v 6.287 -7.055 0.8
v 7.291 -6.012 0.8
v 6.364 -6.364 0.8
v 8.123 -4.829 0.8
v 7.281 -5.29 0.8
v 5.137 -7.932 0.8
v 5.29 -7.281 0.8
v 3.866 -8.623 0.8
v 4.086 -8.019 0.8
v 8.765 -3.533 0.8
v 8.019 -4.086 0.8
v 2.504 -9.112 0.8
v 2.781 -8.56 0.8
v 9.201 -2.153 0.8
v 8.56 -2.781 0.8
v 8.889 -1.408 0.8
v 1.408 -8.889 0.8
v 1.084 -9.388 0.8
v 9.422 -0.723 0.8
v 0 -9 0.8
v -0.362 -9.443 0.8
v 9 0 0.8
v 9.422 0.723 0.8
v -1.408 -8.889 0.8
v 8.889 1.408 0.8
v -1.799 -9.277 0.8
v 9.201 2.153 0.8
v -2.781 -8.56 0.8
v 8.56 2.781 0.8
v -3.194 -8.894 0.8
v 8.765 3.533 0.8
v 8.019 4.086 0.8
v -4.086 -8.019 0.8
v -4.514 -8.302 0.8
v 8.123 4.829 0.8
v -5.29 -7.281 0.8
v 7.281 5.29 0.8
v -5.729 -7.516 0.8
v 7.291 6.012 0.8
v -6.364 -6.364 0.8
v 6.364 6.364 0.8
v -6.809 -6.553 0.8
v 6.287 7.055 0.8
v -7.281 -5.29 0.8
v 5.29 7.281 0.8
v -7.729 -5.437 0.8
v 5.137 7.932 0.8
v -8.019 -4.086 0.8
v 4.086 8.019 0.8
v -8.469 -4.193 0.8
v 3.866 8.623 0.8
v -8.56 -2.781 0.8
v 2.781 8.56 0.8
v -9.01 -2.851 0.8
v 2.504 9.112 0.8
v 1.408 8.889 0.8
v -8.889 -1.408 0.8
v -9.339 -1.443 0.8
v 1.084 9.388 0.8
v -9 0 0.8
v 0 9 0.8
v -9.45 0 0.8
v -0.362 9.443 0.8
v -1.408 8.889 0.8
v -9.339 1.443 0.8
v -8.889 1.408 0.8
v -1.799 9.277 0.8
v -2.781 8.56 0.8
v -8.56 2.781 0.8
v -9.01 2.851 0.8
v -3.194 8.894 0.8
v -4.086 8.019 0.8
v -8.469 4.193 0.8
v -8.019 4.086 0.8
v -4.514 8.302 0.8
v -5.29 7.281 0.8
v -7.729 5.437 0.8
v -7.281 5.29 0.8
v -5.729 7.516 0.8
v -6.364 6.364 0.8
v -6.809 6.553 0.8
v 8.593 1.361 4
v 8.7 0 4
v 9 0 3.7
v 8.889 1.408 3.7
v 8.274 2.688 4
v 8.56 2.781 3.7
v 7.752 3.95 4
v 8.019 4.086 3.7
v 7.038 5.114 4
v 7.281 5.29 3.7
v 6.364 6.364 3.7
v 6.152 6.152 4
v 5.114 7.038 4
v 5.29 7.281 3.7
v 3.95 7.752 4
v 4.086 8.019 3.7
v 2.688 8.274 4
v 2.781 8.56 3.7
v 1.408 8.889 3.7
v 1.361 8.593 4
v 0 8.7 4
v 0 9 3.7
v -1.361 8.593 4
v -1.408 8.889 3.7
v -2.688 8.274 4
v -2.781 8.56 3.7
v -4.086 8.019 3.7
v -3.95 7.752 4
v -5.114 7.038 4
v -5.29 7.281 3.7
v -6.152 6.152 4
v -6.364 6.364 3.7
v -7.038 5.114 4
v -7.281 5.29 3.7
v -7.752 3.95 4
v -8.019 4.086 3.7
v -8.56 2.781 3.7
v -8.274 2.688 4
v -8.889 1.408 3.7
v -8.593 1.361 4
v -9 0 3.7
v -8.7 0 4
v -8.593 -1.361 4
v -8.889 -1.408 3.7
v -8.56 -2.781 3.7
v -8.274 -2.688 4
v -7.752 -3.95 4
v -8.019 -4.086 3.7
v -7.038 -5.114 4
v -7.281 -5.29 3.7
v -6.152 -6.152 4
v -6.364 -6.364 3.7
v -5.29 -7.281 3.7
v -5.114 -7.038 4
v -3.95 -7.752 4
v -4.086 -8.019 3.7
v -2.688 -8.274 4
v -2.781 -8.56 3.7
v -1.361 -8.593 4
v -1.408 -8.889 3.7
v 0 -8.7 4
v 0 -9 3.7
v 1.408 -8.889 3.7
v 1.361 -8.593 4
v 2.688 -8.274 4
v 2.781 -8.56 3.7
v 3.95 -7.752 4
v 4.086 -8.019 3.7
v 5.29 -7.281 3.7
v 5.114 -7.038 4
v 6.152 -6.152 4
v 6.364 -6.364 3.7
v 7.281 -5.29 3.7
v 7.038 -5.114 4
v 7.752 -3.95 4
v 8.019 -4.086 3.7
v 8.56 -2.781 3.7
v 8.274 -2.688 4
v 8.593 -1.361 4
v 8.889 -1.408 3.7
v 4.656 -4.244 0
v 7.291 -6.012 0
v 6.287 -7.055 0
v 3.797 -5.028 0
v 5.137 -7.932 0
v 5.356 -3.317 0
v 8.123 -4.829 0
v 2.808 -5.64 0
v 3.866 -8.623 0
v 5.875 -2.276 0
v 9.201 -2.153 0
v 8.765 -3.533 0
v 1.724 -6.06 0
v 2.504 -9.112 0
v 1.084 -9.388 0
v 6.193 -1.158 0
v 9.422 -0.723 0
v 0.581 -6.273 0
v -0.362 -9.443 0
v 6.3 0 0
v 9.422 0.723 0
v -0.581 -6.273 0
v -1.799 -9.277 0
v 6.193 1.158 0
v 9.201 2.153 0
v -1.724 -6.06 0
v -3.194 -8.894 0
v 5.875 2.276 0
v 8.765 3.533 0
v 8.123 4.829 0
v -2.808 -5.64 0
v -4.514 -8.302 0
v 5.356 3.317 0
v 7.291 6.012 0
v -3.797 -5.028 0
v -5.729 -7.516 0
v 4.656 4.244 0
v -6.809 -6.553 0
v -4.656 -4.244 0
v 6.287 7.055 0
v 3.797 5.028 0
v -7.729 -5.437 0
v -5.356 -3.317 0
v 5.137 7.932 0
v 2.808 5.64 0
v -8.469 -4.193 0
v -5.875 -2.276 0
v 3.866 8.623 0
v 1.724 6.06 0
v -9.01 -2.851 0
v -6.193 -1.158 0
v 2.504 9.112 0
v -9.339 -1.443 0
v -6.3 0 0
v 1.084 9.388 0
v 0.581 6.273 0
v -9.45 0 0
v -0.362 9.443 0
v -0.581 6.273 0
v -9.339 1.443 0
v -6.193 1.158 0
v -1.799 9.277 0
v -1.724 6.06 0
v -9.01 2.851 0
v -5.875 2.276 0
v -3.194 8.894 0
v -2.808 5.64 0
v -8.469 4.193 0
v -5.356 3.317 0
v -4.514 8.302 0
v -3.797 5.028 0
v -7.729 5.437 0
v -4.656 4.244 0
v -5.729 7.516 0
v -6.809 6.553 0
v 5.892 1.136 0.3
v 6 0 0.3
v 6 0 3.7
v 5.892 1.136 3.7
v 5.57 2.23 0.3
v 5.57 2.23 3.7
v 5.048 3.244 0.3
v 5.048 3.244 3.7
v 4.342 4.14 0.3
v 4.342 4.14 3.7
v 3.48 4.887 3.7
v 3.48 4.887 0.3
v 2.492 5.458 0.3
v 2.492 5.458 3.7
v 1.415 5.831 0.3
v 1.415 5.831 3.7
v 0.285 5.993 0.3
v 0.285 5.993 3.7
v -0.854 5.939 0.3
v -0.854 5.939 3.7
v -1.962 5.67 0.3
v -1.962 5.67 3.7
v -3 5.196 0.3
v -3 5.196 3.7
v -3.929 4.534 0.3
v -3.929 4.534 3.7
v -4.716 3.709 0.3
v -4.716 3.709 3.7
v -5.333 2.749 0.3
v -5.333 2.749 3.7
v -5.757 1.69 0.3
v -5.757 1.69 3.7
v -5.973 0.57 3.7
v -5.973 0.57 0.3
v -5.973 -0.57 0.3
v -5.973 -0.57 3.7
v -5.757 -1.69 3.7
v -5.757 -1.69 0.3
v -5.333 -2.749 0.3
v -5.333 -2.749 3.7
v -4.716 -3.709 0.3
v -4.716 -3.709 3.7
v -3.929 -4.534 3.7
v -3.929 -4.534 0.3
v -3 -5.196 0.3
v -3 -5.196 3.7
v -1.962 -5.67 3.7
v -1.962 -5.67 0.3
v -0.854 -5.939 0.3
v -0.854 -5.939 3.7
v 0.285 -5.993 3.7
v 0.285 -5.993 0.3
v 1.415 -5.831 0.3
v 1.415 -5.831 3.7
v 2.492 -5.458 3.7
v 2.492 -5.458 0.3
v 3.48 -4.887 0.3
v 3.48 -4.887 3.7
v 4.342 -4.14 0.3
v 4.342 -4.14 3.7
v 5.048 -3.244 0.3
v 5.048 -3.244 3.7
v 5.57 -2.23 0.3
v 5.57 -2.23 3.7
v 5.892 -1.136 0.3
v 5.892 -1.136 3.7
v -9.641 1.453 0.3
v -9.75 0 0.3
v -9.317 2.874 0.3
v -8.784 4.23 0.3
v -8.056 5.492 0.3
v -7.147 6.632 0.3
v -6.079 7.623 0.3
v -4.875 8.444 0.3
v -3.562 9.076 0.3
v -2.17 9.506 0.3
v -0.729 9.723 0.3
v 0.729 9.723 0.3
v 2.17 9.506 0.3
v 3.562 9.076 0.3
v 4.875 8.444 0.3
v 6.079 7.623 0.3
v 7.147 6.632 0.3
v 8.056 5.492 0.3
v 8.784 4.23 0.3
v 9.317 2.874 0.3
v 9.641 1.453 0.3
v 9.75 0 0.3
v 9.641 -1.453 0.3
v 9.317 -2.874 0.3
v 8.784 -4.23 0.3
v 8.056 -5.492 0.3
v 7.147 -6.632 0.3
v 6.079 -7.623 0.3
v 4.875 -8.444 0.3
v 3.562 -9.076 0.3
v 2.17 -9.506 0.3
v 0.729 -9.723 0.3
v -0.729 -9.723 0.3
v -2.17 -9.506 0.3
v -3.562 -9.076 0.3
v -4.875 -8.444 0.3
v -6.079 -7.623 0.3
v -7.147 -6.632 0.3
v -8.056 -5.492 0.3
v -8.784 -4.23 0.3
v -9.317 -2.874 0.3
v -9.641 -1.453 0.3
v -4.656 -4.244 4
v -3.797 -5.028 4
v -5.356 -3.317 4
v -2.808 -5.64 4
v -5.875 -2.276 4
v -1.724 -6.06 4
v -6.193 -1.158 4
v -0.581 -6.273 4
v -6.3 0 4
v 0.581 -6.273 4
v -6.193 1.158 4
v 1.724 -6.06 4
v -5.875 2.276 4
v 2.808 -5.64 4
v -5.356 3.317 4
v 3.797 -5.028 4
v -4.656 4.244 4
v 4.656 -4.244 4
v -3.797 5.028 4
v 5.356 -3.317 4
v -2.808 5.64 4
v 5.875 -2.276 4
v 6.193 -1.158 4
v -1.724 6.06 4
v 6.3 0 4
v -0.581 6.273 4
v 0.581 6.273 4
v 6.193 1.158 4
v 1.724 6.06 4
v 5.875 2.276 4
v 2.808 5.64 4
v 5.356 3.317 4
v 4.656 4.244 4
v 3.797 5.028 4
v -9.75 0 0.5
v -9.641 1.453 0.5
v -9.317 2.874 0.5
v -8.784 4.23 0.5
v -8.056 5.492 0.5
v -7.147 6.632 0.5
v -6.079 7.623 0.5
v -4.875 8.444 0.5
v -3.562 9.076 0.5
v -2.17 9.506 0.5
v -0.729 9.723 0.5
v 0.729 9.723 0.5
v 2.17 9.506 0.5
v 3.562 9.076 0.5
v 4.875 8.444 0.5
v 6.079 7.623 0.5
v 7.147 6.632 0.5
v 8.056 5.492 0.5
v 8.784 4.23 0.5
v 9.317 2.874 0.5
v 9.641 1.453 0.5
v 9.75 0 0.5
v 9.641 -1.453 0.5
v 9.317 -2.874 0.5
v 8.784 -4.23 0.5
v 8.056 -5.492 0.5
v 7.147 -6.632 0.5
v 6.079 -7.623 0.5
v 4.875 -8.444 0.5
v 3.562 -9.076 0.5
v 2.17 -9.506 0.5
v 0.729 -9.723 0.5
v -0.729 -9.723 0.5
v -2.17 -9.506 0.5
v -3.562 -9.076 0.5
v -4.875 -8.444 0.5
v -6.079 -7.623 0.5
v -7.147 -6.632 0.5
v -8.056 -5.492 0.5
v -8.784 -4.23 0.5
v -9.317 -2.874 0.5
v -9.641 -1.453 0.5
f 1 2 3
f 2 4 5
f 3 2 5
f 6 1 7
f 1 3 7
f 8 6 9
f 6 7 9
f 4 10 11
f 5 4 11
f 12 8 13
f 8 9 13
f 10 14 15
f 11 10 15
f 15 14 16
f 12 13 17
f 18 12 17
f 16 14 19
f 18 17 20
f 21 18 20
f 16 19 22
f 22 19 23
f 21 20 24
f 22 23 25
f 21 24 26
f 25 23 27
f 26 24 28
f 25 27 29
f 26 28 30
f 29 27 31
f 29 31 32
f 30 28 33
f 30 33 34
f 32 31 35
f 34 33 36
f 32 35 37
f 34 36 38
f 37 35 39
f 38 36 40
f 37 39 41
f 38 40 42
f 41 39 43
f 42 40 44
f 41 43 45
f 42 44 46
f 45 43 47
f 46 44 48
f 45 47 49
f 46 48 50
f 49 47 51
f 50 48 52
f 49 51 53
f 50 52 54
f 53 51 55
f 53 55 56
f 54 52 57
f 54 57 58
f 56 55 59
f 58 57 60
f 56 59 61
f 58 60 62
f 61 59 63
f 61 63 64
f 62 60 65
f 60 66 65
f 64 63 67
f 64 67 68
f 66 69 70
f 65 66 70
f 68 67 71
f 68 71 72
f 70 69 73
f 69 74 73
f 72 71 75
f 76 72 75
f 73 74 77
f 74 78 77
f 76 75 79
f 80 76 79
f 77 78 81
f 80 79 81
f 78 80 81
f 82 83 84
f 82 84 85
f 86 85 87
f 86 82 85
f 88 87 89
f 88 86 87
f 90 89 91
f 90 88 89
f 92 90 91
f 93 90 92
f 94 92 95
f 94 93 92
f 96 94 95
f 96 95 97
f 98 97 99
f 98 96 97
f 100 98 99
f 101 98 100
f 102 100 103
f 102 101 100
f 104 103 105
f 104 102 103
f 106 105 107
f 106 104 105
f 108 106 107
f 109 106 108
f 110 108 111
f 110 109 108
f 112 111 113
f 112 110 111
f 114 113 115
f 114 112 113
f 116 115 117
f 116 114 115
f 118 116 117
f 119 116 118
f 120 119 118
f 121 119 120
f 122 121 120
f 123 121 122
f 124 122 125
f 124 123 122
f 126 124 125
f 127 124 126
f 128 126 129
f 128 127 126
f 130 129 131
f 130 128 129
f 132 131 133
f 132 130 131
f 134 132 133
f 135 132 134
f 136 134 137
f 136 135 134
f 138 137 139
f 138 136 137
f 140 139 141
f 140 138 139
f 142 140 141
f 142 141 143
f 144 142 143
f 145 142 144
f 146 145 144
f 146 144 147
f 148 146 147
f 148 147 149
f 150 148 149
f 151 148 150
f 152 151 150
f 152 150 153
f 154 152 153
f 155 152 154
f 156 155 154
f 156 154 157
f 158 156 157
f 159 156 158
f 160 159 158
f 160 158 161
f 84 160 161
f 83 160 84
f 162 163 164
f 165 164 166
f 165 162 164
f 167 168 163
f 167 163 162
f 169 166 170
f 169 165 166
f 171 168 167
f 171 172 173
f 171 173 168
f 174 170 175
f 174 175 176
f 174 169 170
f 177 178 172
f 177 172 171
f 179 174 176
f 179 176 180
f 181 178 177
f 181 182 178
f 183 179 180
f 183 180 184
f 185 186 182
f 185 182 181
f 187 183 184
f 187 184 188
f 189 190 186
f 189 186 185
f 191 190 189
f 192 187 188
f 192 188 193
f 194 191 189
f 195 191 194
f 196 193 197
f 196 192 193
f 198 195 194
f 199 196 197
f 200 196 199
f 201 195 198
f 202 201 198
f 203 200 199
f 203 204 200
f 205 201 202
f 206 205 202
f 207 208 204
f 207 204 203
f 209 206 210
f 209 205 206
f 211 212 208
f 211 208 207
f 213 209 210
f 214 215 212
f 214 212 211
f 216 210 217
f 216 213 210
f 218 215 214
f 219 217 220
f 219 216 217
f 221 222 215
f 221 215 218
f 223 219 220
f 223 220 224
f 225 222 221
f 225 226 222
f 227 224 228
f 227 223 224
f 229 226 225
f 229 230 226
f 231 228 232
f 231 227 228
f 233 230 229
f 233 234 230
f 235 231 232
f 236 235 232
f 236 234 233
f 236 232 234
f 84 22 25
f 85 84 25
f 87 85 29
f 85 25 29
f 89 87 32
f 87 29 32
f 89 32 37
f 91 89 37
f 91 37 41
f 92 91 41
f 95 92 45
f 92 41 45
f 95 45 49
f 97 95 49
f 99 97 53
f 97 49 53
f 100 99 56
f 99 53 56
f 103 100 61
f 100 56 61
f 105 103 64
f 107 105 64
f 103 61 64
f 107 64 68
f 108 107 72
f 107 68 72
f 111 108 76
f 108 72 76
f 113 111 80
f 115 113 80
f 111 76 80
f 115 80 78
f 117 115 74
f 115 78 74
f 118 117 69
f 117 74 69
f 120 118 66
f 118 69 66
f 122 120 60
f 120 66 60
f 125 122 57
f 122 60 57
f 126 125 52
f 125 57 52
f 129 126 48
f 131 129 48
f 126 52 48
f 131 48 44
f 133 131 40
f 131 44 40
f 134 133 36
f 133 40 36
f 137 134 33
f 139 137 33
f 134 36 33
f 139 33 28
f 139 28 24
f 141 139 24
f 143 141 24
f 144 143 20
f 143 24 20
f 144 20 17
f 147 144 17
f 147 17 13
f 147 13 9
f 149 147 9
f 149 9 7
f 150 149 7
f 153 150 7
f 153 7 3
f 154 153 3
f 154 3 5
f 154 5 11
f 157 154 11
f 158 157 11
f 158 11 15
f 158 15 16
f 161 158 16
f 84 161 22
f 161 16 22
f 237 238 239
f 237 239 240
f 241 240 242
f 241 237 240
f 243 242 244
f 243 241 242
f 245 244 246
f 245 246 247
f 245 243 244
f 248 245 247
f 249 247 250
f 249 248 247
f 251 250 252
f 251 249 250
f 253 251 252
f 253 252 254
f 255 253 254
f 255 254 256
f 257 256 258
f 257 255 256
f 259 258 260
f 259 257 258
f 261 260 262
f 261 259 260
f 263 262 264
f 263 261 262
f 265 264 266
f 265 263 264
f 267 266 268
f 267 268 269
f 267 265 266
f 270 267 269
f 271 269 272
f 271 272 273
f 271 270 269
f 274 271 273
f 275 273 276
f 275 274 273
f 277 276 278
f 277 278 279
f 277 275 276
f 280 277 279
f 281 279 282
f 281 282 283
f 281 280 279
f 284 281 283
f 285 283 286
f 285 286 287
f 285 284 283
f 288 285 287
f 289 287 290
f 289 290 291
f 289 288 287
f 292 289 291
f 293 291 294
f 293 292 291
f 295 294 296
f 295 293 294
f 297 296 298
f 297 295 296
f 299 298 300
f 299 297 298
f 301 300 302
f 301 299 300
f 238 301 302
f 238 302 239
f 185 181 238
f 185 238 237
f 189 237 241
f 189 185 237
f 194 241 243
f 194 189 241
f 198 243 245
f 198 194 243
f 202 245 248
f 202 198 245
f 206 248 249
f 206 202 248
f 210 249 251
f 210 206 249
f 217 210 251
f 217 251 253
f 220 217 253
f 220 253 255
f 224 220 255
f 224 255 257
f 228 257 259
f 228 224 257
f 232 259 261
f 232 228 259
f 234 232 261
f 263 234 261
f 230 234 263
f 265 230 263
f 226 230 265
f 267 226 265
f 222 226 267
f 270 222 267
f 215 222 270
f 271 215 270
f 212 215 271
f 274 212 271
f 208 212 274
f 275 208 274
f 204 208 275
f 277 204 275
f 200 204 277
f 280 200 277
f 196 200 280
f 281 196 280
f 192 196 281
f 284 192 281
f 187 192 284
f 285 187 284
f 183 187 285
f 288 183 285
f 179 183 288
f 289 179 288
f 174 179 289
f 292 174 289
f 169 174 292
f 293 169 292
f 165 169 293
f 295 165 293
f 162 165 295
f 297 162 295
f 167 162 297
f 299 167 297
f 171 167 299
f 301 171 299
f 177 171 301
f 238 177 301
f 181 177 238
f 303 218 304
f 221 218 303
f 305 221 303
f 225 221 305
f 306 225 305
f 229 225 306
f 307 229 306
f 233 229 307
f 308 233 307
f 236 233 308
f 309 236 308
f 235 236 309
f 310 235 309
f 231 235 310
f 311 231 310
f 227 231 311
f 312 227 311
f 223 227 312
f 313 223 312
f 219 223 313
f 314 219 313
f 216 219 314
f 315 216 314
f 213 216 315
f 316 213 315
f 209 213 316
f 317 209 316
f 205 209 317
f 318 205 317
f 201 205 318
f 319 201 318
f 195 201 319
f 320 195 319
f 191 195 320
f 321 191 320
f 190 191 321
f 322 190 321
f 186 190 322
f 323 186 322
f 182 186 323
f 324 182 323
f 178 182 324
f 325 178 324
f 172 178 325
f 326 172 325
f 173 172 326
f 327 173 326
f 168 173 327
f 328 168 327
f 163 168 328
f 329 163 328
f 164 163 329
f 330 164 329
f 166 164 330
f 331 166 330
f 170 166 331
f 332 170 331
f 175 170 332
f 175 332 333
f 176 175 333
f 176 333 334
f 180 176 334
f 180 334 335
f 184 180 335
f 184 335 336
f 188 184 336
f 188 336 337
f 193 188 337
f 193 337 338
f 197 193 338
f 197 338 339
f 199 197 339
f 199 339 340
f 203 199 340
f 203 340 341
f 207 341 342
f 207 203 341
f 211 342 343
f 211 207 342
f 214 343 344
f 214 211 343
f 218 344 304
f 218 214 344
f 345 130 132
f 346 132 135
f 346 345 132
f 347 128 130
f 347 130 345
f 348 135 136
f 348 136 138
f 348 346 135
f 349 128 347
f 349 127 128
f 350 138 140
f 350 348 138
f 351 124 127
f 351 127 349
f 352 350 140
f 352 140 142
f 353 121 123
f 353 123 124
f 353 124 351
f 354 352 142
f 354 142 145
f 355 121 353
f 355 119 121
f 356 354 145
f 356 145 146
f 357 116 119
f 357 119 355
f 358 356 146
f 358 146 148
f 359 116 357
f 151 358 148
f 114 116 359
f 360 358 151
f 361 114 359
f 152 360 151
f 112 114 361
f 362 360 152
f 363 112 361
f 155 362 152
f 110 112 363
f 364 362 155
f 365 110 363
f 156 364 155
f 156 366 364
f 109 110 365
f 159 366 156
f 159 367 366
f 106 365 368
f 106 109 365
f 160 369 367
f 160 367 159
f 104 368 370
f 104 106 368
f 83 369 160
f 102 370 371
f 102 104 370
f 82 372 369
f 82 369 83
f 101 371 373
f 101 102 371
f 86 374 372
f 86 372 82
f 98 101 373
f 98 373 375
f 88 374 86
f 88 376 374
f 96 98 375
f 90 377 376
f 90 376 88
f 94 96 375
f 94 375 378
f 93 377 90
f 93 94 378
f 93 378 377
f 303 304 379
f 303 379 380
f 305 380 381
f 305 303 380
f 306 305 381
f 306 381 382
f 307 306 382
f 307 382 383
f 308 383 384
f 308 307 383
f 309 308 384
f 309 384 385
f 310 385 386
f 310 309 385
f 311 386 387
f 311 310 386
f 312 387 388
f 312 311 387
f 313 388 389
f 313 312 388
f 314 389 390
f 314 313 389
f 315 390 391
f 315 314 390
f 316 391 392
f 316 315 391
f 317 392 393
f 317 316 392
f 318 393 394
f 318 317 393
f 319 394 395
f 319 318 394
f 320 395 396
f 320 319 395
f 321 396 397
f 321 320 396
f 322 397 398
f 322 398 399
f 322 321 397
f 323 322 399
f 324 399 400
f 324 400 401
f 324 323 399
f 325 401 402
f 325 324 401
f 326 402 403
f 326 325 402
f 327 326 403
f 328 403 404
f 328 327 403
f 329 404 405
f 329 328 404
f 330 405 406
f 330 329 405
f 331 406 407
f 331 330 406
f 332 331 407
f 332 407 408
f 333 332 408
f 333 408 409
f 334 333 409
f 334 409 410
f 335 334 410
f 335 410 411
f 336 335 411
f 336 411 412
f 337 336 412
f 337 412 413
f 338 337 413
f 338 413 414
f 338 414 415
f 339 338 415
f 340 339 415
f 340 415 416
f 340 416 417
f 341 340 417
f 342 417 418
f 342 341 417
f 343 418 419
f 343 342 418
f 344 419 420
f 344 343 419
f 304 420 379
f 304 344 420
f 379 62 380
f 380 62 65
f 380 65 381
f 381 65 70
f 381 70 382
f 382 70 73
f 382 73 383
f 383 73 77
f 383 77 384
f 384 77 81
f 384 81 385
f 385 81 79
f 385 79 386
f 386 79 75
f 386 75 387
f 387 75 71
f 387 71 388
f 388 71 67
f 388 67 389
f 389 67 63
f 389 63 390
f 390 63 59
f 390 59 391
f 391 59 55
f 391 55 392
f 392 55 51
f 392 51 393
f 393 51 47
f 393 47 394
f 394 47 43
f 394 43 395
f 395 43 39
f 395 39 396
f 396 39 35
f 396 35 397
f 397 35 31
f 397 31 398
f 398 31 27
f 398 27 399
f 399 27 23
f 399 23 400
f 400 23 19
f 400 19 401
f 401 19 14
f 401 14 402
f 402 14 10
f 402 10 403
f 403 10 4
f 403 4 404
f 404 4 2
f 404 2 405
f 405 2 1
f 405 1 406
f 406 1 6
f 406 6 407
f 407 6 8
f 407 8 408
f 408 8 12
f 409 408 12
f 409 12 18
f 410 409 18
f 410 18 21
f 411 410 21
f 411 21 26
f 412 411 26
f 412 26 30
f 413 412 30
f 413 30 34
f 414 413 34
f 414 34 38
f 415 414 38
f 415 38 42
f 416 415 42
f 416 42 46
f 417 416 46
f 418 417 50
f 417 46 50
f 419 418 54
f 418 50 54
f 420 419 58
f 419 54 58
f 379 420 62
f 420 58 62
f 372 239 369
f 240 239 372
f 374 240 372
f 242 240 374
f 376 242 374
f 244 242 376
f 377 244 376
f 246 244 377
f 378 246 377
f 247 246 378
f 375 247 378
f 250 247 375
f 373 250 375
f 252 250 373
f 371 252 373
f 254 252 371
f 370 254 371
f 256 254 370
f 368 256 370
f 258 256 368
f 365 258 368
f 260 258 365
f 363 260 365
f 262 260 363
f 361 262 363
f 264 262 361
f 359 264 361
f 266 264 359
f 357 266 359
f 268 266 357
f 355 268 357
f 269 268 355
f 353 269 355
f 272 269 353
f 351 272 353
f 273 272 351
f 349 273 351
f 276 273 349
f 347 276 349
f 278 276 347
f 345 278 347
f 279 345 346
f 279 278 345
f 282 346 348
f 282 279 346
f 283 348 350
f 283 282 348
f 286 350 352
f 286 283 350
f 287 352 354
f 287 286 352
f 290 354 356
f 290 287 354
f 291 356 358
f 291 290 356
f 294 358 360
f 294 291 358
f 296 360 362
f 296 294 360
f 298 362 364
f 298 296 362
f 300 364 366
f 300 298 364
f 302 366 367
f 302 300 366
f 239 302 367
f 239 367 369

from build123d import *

# Parameters (mm, degrees)
SKETCH_1_R      = 9
SKETCH_1_R_2    = 6
EXTRUDE_1_DEPTH = 4
SKETCH_2_R      = 9.75
SKETCH_2_R_2    = 9
EXTRUDE_2_DEPTH = 0.8
CHAMFER_1_SIZE  = 0.3


with BuildPart() as part:
    # 草图1 → 凸台-拉伸1 (new body)
    with BuildSketch(Plane.XY):
        Circle(SKETCH_1_R)
        Circle(SKETCH_1_R_2, mode=Mode.SUBTRACT)
    extrude(amount=EXTRUDE_1_DEPTH)

    # 草图2 → 凸台-拉伸2 (add)
    with BuildSketch(Plane(origin=(0, 0, 0), x_dir=(-1, 0, 0), z_dir=(0, 0, -1))):
        Circle(SKETCH_2_R)
        Circle(SKETCH_2_R_2, mode=Mode.SUBTRACT)
    extrude(amount=-EXTRUDE_2_DEPTH)

    # 倒角1
    chamfer_1_edges = [part.edges().sort_by_distance(p)[0] for p in [
        (9.75, 0, 0.8),
        (9.75, 0, 0),
        (-9, 0, 4),
        (-6, 0, 0),
        (-6, 0, 4),
    ]]
    chamfer(chamfer_1_edges, length=CHAMFER_1_SIZE)


solid = part.part
